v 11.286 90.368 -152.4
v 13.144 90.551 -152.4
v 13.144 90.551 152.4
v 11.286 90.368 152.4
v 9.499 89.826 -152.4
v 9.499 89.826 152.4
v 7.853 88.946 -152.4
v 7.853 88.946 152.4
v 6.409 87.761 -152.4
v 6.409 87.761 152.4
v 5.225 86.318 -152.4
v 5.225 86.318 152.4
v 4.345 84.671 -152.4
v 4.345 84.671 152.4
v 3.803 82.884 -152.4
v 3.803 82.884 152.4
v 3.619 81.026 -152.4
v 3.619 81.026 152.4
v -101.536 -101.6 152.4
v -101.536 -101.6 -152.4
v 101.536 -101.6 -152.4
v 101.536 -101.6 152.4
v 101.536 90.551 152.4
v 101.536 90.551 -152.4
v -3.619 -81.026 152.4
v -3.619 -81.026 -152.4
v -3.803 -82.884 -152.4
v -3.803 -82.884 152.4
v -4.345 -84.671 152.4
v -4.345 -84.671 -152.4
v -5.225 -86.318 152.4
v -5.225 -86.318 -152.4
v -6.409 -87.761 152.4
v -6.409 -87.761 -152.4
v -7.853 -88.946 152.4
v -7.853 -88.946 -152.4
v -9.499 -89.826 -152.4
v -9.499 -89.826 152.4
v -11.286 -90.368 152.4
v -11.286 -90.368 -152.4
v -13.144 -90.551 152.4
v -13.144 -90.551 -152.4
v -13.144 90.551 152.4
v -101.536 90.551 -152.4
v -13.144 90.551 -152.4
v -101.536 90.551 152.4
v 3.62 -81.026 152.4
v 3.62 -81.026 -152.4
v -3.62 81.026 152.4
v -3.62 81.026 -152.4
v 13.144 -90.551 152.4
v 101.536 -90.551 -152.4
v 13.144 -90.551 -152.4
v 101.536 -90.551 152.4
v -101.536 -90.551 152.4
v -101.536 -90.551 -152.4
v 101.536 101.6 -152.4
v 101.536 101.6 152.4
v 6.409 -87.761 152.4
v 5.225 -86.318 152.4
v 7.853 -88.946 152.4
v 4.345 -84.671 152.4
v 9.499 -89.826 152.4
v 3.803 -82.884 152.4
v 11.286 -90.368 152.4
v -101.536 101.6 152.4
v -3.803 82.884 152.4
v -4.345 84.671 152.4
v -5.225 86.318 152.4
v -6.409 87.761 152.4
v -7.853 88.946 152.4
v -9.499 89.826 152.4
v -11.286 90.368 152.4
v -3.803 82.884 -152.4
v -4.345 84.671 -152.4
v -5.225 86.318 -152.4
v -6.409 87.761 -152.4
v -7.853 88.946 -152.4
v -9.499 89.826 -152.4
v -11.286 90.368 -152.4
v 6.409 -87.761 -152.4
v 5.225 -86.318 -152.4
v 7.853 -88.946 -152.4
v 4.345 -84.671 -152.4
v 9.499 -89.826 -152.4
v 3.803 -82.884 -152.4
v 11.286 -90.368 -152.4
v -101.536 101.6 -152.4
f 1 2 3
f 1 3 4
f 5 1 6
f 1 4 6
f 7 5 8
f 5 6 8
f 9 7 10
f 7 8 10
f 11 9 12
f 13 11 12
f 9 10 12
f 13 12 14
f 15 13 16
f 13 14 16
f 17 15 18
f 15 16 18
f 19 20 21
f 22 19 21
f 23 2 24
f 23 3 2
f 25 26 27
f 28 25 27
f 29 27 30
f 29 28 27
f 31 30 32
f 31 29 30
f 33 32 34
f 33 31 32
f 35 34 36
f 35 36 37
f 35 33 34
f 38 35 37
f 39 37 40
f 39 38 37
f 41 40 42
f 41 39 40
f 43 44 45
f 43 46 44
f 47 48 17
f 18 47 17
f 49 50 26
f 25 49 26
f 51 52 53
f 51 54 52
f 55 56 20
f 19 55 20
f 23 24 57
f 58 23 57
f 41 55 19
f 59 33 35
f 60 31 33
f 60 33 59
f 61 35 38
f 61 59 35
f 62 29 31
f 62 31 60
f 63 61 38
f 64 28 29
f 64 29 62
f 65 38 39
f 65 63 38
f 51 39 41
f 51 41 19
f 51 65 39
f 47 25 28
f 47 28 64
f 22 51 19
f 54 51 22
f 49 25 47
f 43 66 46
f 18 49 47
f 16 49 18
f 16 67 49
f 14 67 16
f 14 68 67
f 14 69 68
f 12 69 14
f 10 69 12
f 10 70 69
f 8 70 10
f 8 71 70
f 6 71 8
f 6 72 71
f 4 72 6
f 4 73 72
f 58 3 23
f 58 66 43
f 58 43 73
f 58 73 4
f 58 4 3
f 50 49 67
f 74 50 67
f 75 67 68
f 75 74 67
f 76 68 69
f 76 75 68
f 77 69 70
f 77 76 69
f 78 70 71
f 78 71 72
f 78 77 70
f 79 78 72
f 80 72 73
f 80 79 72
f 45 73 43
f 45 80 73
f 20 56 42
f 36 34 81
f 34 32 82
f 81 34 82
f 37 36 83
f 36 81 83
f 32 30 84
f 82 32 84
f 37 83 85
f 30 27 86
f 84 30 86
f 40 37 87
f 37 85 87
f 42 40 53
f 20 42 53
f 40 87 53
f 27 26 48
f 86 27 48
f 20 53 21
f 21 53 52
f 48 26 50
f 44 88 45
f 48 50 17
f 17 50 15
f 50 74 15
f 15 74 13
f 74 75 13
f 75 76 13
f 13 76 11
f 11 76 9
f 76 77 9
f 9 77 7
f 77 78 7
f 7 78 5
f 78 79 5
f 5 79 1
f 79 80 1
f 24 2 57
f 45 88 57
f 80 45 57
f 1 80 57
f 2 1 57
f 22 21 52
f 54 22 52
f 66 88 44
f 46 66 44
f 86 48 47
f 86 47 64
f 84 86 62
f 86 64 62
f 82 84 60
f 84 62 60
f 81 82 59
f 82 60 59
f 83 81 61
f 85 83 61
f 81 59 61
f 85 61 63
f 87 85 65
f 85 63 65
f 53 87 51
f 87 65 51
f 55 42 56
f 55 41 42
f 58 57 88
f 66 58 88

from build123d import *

# Parameters (mm, degrees)
BOSS_EXTRUDE1_DEPTH = 152.4
FILLET1_R           = 9.525


with BuildPart() as part:
    # Sketch2 → Boss-Extrude1 (new body, symmetric)
    with BuildSketch(Plane.XY):
        Polygon((-3.6195, 90.551), (-3.6195, -90.551), (-101.5365, -90.551), (-101.5365, -101.6), (101.5365, -101.6), (101.5365, -90.551), (3.6195, -90.551), (3.6195, 90.551), (101.5365, 90.551), (101.5365, 101.6), (-101.5365, 101.6), (-101.5365, 90.551), align=None)
    extrude(amount=BOSS_EXTRUDE1_DEPTH, both=True)

    # Fillet1
    fillet1_edges = [part.edges().sort_by_distance(p)[0] for p in [
        (-3.6195, -90.551, 0),
        (-3.6195, 90.551, 0),
        (3.6195, 90.551, 0),
        (3.6195, -90.551, 0),
    ]]
    fillet(fillet1_edges, radius=FILLET1_R)


solid = part.part
